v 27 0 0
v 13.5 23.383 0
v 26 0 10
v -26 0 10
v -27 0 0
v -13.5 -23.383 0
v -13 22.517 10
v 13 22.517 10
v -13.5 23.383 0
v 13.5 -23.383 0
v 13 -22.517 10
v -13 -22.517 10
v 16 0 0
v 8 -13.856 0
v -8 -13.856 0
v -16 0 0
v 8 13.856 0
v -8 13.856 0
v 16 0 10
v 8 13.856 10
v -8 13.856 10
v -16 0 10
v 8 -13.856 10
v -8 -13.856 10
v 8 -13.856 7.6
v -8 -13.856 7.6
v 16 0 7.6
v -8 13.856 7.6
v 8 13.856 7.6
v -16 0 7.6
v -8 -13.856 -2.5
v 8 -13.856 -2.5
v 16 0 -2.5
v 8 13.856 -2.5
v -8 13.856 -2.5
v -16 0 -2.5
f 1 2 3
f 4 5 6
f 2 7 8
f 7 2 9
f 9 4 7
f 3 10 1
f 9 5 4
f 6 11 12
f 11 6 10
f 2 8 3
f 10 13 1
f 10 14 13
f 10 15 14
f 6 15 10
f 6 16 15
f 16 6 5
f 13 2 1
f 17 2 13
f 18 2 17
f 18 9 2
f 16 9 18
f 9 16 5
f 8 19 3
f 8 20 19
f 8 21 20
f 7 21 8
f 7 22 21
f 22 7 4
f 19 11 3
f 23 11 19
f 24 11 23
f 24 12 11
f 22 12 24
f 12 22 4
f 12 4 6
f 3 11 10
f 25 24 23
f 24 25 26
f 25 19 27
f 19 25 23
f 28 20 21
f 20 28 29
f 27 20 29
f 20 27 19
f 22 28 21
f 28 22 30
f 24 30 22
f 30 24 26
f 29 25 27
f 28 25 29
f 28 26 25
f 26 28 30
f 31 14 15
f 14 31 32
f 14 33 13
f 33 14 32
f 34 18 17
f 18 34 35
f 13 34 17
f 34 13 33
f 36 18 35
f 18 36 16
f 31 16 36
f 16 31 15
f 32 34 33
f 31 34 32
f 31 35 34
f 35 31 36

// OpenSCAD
/* === Piece selection === */
piece = "stacker";

/* === Basic Dimensions === */
base_thickness = 10;
base_radius = 34;
base_connector_thickness = 2.5;
base_connector_radius = 16;
path_center_offset = 1.5;
path_radius = 6.75;
port_bottom_offset = 2.5;
port_length = 6;
rail_gap = 7;
rail_radius = 1.5;
rail_small_length = 65;
rail_decoration_radius = 9;
rail_decoration_thickness = 2;
rail_decoration_z_offset = 6;
rail_decoration_length = 9;
rail_decoration_cutoff_factor = 1.25;
stacker_height = 10;

/* === Derivatives === */
base_apothem = sqrt(3) / 2 * base_radius;

// inter-piece distance, vertical means flat side to flat side
vertical_ipd = base_apothem * 2;

large_bend_circle_radius = vertical_ipd - .8 - path_radius;
small_bend_circle_radius = 24 + .6 - path_radius;

tower_radius = 26;
tower_height = 70;

/* === Rendering === */
torus_detail = $preview ? 16 : 64;
rotate_extrude_detail = $preview ? 32 : 128;
csg_sub_correction = 0.01;

/* === Colors (OpenSCAD only) === */
primary_color = "white";
secondary_color = "#79B51C";
tertiary_color = "gray";
quaternary_color = "#333";

module base() {
    color(primary_color)
    cylinder(r=base_radius, h=base_thickness, $fn=6);
    connector();
}

module connector() {
    color(primary_color)
    translate([0, 0, -base_connector_thickness])
    cylinder(r=base_connector_radius, h=base_connector_thickness, $fn=6);    
}

module path_bend_top() {
    color(secondary_color)
    translate([0, vertical_ipd, base_thickness + path_center_offset])
    rotate_extrude(convexity = 10, $fn = rotate_extrude_detail)
    translate([large_bend_circle_radius, 0, 0])
    circle(r = path_radius, $fn = torus_detail);
}

module path_bend_bottom_right() {
    color(secondary_color)
    translate([vertical_ipd * 0.29, -vertical_ipd * 0.5, base_thickness + path_center_offset])
    rotate_extrude(convexity = 10, $fn = rotate_extrude_detail)
    translate([small_bend_circle_radius, 0, 0])
    circle(r = path_radius, $fn = torus_detail);
}

module path_straight(rot = 0) {
    translate([0, 0, base_thickness + path_center_offset])
    rotate([0, 90, rot]) {
        linear_extrude(base_radius * 2, center = true, convexity = 10)
        circle(r = path_radius, $fn = torus_detail);        
    }
}

module path_lateral_to_diagonal(flip_x = 0) {
    difference() {
        color(secondary_color)
        mirror([0, 1, 0])
        mirror([flip_x, 0, 0])
        translate([base_radius, base_radius * -0.5 - 2, base_thickness + path_center_offset])
        rotate_extrude(convexity = 10, $fn = rotate_extrude_detail)
        translate([base_radius, 0, 0])
        circle(r = path_radius, $fn = torus_detail);
        util_lower_cutoff(0.65);
    }
}

module port_lateral_sub(y_dir = 1, width = path_radius * 2) {
    translate([
        0,
        y_dir * base_apothem,
        (base_thickness + port_bottom_offset) * 0.5 + csg_sub_correction
    ])
    color(primary_color)
    cube([
        width, 
        port_length, 
        base_thickness - port_bottom_offset
    ], true);
}

module port_sub(x_dir = 1, y_dir = 1, width = path_radius * 2) {
    c = base_radius;
    a = c * sin(60);
    //b = base_radius / 2;
    //a = sqrt(pow(c, 2) - pow(b, 2));
    port_x = (a - port_length / 2) * cos(30) + csg_sub_correction;
    port_y = (a - port_length / 2) * sin(30) + csg_sub_correction;
    
    translate([
        x_dir * port_x,
        y_dir * port_y,
        (base_thickness + port_bottom_offset) * 0.5 + csg_sub_correction
    ])
    rotate([0, 0, 60 * -x_dir * y_dir])
    color(primary_color)
    cube([
        width, 
        port_length, 
        base_thickness - port_bottom_offset
    ], true);
}

module rail_decoration_sub() {
    translate([0, 0, rail_decoration_z_offset])
    difference() {
        rotate([0, 90, 0]) 
        difference() {
            cylinder(h = rail_decoration_length, r = rail_decoration_radius, center = true);
            cylinder(h = rail_decoration_length + csg_sub_correction, r = rail_decoration_radius - rail_decoration_thickness, center = true);
        }
        translate([0, 0, rail_decoration_radius / 2])
        cube([rail_decoration_length + csg_sub_correction, rail_decoration_radius * 2, rail_decoration_radius * rail_decoration_cutoff_factor], true);    
    }    
}

module rail_cap_sub() {
    translate([0, 0, -rail_radius * 2])
    rotate([90, 0, 0])
    rotate_extrude(angle = 90, convexity = 10, $fn = rotate_extrude_detail)
    translate([rail_radius * 2, 0, 0])
    circle(r = rail_radius);
}

module rail_cap_pair_sub(rail_length) {
    translate([rail_length / 2, 0 , 0])
    rail_cap_sub();

    translate([-rail_length / 2, 0 , 0])
    rotate([0, 0, 180]) {
        rail_cap_sub();    
    }
}

module rail_length_sub(rail_length) {
    translate([0, rail_gap / 2 + rail_radius, 0])
    rotate([0, 90, 0])
    cylinder(r = rail_radius, h = rail_length, center=true, $fn = torus_detail);
    translate([0, -(rail_gap / 2 + rail_radius), 0])
    rotate([0, 90, 0])
    cylinder(r = rail_radius, h = rail_length, center=true, $fn = torus_detail);
    
    translate([0, rail_radius + rail_gap / 2, 0])
    rail_cap_pair_sub(rail_length);

    translate([0, -(rail_radius + rail_gap / 2), 0])
    rail_cap_pair_sub(rail_length);
}

module util_lower_cutoff(cutoff_factor = 0) {
    cutoff = base_apothem * cutoff_factor;
    
    translate([0, base_apothem * 0.5 + cutoff * 0.5, base_thickness * 0.5])
    cube([base_radius * 2, base_apothem - cutoff, base_thickness], true);
}

module port(x_dir = 1, y_dir = 1) {
    difference() {
        port_sub(x_dir, y_dir, path_radius  * 2);
        port_sub(x_dir, y_dir, path_radius);
    }
}

module port_lateral(y_dir = 1) {
    difference() {
        port_lateral_sub(y_dir, path_radius * 2);
        port_lateral_sub(y_dir, path_radius);
    }
}

module piece_curve() {
    difference() {    
        base();
        port(1, 1);
        port(-1, 1);
        port(1, -1);
        port_lateral(-1);
        path_bend_top();
        path_bend_bottom_right();
    }
}

module tower_base() {
    difference() {
        color(tertiary_color)
        cylinder(r=tower_radius, h=tower_height, $fn=6);
        translate([0, 0, tower_height - base_connector_thickness + 0.1])
        color(secondary_color)
        cylinder(r=base_connector_radius, h=base_connector_thickness, $fn=6);        
    }
    connector();
}

module piece_tower() {
    tower_base();
}

module stacker_sub(height, col) {
    difference () {
        color(col)
        cylinder(r1=tower_radius + 1, r2=tower_radius, h=height, $fn=6);
        translate([0, 0, height - base_connector_thickness + 0.1])
        color(col)
        cylinder(r=base_connector_radius, h=base_connector_thickness, $fn=6);                
    }
    connector();
}

module piece_stacker() {
    stacker_sub(stacker_height, tertiary_color);
}

module piece_stacker_half() {
    stacker_sub(stacker_height / 2, quaternary_color);
}

module piece_threeway() {
    difference() {
        base();
        port_lateral(-1);
        port_lateral(1);
        port(-1,-1);
        port(1,-1);
        path_lateral_to_diagonal(0);
        path_lateral_to_diagonal(1);
        path_straight(90);
    }
}

module piece_rail_small() {
    rail_length_sub(rail_small_length);
    translate([25, 0, 0])
    rail_decoration_sub();
    translate([-25, 0, 0])
    rail_decoration_sub();
}

/* === Piece generation === */
if (piece == "curve") piece_curve();
if (piece == "tower") piece_tower();
if (piece == "stacker_half") piece_stacker_half();
if (piece == "stacker") piece_stacker();
if (piece == "threeway") piece_threeway();
if (piece == "rail_small") piece_rail_small();
